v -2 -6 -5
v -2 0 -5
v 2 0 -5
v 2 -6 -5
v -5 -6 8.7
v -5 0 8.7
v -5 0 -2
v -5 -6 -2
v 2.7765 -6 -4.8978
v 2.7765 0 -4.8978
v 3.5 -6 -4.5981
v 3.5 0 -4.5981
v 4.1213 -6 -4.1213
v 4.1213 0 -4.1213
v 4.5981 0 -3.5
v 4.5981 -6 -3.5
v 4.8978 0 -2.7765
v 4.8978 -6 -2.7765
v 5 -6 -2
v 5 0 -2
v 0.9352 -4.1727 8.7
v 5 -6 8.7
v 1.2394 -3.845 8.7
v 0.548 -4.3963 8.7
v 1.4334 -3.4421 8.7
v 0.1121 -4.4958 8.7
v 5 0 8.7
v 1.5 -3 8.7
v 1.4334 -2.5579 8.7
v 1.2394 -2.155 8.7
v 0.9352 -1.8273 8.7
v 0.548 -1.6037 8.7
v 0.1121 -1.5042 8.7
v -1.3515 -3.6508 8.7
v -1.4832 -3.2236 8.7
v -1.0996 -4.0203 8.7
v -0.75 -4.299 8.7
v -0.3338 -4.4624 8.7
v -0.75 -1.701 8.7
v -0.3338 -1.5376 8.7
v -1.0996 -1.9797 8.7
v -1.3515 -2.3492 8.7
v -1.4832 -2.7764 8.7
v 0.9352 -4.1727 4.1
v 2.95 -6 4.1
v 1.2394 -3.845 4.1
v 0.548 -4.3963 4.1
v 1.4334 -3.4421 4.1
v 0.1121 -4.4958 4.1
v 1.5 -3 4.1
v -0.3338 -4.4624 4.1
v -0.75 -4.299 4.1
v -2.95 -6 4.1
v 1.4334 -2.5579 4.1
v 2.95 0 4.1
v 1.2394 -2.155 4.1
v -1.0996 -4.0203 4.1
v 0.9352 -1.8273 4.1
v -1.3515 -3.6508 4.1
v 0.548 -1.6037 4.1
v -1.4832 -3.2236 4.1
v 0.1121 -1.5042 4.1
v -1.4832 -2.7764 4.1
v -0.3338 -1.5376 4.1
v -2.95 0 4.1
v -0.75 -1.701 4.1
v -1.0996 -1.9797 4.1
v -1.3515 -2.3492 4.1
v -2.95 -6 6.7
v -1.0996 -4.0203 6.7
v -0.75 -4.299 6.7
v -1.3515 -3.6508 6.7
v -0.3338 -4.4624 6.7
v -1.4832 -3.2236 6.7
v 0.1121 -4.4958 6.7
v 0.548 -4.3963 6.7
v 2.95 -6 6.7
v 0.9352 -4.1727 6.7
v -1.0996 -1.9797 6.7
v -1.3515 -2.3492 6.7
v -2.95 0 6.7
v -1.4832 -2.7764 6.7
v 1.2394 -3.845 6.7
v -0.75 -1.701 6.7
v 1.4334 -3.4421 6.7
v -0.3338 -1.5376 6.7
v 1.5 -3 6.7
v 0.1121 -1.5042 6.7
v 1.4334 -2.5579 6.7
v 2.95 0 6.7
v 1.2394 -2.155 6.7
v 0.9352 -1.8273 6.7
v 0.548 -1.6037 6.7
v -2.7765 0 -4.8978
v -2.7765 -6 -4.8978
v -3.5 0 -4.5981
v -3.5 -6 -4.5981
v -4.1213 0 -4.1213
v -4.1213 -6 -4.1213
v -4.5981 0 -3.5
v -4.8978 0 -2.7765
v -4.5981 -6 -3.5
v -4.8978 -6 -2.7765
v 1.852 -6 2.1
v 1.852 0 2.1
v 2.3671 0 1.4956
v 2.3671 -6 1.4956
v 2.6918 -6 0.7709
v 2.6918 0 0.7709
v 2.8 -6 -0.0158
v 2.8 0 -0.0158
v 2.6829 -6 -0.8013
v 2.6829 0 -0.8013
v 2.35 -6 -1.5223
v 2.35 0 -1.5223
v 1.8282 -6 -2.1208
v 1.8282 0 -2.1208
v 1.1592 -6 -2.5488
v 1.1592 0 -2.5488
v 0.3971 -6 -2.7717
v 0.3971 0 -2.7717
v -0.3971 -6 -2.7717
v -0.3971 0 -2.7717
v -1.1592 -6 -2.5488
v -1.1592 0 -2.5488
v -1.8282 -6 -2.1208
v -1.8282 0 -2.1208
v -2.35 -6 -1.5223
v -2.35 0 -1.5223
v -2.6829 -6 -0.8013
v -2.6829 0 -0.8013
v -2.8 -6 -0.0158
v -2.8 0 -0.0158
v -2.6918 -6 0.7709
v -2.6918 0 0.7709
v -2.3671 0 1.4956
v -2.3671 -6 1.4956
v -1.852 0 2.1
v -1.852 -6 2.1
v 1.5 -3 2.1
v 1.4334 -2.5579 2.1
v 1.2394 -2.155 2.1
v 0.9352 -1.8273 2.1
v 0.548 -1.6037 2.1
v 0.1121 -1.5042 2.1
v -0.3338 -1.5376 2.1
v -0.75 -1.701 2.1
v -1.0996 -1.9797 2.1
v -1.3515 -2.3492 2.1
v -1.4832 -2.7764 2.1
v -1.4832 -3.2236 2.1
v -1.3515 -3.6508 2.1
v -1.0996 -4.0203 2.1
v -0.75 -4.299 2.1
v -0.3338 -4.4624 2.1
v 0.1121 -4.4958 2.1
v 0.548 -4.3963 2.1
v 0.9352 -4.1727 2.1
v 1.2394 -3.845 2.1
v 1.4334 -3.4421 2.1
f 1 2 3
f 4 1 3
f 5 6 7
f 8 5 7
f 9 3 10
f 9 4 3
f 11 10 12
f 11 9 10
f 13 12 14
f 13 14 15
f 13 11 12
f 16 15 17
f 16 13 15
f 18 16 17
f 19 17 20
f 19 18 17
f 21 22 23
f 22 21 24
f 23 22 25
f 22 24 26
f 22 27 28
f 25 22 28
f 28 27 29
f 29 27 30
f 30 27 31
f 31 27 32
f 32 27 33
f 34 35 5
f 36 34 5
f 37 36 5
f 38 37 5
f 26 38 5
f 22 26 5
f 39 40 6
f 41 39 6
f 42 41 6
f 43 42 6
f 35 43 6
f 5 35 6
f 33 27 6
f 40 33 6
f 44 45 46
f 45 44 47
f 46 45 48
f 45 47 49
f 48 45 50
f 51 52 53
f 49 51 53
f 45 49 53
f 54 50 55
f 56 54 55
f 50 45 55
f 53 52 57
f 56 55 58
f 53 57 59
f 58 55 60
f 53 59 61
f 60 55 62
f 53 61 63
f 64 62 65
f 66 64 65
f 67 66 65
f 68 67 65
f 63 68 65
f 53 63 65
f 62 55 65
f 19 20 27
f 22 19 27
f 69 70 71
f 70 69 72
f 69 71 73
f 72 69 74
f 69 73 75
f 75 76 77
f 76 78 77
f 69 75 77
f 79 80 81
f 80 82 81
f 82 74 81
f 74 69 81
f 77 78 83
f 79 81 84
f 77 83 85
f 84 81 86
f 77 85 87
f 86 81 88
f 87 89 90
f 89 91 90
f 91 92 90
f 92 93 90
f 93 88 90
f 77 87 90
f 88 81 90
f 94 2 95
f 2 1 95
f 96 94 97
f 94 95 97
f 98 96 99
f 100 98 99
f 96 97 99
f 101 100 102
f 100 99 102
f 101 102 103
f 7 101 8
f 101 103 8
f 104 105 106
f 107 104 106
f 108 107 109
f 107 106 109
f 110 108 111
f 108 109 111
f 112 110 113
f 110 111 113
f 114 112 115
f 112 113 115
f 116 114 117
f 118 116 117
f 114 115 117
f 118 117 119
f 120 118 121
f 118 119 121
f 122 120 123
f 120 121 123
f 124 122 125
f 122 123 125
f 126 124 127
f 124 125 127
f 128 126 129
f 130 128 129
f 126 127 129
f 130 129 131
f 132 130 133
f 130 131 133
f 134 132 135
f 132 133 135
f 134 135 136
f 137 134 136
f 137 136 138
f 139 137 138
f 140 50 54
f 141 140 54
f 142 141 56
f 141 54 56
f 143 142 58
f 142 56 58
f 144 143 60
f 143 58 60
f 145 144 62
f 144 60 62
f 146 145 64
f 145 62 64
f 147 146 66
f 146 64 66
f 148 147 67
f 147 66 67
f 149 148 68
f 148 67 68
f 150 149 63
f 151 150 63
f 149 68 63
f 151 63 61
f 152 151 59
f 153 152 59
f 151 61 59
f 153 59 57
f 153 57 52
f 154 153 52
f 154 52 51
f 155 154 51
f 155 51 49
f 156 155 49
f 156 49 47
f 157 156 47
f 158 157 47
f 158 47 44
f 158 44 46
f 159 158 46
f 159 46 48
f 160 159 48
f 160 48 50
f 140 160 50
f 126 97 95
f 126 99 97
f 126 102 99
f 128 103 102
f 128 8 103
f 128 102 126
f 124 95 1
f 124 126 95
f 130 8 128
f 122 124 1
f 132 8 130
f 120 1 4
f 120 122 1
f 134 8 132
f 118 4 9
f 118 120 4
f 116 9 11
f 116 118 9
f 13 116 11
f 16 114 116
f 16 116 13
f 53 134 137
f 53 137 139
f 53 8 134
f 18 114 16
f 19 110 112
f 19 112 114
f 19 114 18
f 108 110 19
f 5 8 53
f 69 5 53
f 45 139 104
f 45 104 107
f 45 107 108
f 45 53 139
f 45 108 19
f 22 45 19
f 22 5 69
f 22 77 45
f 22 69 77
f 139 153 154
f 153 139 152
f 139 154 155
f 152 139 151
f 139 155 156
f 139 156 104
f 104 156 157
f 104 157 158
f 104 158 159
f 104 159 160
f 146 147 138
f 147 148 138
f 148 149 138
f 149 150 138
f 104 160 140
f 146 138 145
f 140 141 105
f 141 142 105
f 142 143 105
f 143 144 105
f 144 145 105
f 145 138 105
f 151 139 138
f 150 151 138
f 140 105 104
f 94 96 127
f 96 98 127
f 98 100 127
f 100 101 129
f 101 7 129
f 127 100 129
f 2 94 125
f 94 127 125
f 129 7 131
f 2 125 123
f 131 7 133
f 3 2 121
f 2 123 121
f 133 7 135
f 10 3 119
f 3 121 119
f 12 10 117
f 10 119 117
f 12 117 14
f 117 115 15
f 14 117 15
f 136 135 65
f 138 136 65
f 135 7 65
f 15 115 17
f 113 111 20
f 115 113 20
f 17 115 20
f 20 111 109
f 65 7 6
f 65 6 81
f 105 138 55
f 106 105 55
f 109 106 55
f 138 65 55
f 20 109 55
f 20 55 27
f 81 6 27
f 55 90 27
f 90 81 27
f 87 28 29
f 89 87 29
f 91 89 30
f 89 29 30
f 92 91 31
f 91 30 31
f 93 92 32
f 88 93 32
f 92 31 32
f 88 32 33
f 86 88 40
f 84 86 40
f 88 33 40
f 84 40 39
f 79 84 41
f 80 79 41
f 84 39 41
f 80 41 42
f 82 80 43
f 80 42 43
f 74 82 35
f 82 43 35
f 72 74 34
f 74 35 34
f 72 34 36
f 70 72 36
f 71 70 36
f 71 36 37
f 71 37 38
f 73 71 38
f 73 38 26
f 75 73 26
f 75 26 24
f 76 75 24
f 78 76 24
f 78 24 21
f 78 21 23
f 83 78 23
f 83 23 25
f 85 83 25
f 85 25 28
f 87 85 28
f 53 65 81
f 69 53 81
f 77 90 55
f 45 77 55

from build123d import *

# Parameters (mm, degrees)
F1_DEPTH = 6
F2_R     = 1.5
F3_DEPTH = 6.6
F4_R     = 3


with BuildPart() as f1:
    # F0 (on Front) → F1 (new body)
    with BuildSketch(Plane.XZ):
        Polygon((-5, -5), (5, -5), (5, 5), (5, 8.7), (-5, 8.7), (-5, 5), align=None)
        with BuildLine():
            ThreePointArc((1.852026, 2.1), (0, -2.8), (-1.852026, 2.1))
            Line((-1.852026, 2.1), (0, 2.1))
            Line((0, 2.1), (1.852026, 2.1))
        make_face(mode=Mode.SUBTRACT)
        Polygon((2.95, 4.1), (0, 4.1), (-2.95, 4.1), (-2.95, 6.7), (2.95, 6.7), align=None, mode=Mode.SUBTRACT)
    extrude(amount=F1_DEPTH)

    # F2 (on face) → F3 (cut, through all)
    with BuildSketch(Plane.XY.offset(8.7)):
        with Locations((0, -3)):
            Circle(F2_R)
    extrude(amount=-F3_DEPTH, mode=Mode.SUBTRACT)

    # F4
    f4_edges = [f1.edges().sort_by_distance(p)[0] for p in [
        (5, -3, -5),
        (-5, -3, -5),
    ]]
    fillet(f4_edges, radius=F4_R)


solid = f1.part
